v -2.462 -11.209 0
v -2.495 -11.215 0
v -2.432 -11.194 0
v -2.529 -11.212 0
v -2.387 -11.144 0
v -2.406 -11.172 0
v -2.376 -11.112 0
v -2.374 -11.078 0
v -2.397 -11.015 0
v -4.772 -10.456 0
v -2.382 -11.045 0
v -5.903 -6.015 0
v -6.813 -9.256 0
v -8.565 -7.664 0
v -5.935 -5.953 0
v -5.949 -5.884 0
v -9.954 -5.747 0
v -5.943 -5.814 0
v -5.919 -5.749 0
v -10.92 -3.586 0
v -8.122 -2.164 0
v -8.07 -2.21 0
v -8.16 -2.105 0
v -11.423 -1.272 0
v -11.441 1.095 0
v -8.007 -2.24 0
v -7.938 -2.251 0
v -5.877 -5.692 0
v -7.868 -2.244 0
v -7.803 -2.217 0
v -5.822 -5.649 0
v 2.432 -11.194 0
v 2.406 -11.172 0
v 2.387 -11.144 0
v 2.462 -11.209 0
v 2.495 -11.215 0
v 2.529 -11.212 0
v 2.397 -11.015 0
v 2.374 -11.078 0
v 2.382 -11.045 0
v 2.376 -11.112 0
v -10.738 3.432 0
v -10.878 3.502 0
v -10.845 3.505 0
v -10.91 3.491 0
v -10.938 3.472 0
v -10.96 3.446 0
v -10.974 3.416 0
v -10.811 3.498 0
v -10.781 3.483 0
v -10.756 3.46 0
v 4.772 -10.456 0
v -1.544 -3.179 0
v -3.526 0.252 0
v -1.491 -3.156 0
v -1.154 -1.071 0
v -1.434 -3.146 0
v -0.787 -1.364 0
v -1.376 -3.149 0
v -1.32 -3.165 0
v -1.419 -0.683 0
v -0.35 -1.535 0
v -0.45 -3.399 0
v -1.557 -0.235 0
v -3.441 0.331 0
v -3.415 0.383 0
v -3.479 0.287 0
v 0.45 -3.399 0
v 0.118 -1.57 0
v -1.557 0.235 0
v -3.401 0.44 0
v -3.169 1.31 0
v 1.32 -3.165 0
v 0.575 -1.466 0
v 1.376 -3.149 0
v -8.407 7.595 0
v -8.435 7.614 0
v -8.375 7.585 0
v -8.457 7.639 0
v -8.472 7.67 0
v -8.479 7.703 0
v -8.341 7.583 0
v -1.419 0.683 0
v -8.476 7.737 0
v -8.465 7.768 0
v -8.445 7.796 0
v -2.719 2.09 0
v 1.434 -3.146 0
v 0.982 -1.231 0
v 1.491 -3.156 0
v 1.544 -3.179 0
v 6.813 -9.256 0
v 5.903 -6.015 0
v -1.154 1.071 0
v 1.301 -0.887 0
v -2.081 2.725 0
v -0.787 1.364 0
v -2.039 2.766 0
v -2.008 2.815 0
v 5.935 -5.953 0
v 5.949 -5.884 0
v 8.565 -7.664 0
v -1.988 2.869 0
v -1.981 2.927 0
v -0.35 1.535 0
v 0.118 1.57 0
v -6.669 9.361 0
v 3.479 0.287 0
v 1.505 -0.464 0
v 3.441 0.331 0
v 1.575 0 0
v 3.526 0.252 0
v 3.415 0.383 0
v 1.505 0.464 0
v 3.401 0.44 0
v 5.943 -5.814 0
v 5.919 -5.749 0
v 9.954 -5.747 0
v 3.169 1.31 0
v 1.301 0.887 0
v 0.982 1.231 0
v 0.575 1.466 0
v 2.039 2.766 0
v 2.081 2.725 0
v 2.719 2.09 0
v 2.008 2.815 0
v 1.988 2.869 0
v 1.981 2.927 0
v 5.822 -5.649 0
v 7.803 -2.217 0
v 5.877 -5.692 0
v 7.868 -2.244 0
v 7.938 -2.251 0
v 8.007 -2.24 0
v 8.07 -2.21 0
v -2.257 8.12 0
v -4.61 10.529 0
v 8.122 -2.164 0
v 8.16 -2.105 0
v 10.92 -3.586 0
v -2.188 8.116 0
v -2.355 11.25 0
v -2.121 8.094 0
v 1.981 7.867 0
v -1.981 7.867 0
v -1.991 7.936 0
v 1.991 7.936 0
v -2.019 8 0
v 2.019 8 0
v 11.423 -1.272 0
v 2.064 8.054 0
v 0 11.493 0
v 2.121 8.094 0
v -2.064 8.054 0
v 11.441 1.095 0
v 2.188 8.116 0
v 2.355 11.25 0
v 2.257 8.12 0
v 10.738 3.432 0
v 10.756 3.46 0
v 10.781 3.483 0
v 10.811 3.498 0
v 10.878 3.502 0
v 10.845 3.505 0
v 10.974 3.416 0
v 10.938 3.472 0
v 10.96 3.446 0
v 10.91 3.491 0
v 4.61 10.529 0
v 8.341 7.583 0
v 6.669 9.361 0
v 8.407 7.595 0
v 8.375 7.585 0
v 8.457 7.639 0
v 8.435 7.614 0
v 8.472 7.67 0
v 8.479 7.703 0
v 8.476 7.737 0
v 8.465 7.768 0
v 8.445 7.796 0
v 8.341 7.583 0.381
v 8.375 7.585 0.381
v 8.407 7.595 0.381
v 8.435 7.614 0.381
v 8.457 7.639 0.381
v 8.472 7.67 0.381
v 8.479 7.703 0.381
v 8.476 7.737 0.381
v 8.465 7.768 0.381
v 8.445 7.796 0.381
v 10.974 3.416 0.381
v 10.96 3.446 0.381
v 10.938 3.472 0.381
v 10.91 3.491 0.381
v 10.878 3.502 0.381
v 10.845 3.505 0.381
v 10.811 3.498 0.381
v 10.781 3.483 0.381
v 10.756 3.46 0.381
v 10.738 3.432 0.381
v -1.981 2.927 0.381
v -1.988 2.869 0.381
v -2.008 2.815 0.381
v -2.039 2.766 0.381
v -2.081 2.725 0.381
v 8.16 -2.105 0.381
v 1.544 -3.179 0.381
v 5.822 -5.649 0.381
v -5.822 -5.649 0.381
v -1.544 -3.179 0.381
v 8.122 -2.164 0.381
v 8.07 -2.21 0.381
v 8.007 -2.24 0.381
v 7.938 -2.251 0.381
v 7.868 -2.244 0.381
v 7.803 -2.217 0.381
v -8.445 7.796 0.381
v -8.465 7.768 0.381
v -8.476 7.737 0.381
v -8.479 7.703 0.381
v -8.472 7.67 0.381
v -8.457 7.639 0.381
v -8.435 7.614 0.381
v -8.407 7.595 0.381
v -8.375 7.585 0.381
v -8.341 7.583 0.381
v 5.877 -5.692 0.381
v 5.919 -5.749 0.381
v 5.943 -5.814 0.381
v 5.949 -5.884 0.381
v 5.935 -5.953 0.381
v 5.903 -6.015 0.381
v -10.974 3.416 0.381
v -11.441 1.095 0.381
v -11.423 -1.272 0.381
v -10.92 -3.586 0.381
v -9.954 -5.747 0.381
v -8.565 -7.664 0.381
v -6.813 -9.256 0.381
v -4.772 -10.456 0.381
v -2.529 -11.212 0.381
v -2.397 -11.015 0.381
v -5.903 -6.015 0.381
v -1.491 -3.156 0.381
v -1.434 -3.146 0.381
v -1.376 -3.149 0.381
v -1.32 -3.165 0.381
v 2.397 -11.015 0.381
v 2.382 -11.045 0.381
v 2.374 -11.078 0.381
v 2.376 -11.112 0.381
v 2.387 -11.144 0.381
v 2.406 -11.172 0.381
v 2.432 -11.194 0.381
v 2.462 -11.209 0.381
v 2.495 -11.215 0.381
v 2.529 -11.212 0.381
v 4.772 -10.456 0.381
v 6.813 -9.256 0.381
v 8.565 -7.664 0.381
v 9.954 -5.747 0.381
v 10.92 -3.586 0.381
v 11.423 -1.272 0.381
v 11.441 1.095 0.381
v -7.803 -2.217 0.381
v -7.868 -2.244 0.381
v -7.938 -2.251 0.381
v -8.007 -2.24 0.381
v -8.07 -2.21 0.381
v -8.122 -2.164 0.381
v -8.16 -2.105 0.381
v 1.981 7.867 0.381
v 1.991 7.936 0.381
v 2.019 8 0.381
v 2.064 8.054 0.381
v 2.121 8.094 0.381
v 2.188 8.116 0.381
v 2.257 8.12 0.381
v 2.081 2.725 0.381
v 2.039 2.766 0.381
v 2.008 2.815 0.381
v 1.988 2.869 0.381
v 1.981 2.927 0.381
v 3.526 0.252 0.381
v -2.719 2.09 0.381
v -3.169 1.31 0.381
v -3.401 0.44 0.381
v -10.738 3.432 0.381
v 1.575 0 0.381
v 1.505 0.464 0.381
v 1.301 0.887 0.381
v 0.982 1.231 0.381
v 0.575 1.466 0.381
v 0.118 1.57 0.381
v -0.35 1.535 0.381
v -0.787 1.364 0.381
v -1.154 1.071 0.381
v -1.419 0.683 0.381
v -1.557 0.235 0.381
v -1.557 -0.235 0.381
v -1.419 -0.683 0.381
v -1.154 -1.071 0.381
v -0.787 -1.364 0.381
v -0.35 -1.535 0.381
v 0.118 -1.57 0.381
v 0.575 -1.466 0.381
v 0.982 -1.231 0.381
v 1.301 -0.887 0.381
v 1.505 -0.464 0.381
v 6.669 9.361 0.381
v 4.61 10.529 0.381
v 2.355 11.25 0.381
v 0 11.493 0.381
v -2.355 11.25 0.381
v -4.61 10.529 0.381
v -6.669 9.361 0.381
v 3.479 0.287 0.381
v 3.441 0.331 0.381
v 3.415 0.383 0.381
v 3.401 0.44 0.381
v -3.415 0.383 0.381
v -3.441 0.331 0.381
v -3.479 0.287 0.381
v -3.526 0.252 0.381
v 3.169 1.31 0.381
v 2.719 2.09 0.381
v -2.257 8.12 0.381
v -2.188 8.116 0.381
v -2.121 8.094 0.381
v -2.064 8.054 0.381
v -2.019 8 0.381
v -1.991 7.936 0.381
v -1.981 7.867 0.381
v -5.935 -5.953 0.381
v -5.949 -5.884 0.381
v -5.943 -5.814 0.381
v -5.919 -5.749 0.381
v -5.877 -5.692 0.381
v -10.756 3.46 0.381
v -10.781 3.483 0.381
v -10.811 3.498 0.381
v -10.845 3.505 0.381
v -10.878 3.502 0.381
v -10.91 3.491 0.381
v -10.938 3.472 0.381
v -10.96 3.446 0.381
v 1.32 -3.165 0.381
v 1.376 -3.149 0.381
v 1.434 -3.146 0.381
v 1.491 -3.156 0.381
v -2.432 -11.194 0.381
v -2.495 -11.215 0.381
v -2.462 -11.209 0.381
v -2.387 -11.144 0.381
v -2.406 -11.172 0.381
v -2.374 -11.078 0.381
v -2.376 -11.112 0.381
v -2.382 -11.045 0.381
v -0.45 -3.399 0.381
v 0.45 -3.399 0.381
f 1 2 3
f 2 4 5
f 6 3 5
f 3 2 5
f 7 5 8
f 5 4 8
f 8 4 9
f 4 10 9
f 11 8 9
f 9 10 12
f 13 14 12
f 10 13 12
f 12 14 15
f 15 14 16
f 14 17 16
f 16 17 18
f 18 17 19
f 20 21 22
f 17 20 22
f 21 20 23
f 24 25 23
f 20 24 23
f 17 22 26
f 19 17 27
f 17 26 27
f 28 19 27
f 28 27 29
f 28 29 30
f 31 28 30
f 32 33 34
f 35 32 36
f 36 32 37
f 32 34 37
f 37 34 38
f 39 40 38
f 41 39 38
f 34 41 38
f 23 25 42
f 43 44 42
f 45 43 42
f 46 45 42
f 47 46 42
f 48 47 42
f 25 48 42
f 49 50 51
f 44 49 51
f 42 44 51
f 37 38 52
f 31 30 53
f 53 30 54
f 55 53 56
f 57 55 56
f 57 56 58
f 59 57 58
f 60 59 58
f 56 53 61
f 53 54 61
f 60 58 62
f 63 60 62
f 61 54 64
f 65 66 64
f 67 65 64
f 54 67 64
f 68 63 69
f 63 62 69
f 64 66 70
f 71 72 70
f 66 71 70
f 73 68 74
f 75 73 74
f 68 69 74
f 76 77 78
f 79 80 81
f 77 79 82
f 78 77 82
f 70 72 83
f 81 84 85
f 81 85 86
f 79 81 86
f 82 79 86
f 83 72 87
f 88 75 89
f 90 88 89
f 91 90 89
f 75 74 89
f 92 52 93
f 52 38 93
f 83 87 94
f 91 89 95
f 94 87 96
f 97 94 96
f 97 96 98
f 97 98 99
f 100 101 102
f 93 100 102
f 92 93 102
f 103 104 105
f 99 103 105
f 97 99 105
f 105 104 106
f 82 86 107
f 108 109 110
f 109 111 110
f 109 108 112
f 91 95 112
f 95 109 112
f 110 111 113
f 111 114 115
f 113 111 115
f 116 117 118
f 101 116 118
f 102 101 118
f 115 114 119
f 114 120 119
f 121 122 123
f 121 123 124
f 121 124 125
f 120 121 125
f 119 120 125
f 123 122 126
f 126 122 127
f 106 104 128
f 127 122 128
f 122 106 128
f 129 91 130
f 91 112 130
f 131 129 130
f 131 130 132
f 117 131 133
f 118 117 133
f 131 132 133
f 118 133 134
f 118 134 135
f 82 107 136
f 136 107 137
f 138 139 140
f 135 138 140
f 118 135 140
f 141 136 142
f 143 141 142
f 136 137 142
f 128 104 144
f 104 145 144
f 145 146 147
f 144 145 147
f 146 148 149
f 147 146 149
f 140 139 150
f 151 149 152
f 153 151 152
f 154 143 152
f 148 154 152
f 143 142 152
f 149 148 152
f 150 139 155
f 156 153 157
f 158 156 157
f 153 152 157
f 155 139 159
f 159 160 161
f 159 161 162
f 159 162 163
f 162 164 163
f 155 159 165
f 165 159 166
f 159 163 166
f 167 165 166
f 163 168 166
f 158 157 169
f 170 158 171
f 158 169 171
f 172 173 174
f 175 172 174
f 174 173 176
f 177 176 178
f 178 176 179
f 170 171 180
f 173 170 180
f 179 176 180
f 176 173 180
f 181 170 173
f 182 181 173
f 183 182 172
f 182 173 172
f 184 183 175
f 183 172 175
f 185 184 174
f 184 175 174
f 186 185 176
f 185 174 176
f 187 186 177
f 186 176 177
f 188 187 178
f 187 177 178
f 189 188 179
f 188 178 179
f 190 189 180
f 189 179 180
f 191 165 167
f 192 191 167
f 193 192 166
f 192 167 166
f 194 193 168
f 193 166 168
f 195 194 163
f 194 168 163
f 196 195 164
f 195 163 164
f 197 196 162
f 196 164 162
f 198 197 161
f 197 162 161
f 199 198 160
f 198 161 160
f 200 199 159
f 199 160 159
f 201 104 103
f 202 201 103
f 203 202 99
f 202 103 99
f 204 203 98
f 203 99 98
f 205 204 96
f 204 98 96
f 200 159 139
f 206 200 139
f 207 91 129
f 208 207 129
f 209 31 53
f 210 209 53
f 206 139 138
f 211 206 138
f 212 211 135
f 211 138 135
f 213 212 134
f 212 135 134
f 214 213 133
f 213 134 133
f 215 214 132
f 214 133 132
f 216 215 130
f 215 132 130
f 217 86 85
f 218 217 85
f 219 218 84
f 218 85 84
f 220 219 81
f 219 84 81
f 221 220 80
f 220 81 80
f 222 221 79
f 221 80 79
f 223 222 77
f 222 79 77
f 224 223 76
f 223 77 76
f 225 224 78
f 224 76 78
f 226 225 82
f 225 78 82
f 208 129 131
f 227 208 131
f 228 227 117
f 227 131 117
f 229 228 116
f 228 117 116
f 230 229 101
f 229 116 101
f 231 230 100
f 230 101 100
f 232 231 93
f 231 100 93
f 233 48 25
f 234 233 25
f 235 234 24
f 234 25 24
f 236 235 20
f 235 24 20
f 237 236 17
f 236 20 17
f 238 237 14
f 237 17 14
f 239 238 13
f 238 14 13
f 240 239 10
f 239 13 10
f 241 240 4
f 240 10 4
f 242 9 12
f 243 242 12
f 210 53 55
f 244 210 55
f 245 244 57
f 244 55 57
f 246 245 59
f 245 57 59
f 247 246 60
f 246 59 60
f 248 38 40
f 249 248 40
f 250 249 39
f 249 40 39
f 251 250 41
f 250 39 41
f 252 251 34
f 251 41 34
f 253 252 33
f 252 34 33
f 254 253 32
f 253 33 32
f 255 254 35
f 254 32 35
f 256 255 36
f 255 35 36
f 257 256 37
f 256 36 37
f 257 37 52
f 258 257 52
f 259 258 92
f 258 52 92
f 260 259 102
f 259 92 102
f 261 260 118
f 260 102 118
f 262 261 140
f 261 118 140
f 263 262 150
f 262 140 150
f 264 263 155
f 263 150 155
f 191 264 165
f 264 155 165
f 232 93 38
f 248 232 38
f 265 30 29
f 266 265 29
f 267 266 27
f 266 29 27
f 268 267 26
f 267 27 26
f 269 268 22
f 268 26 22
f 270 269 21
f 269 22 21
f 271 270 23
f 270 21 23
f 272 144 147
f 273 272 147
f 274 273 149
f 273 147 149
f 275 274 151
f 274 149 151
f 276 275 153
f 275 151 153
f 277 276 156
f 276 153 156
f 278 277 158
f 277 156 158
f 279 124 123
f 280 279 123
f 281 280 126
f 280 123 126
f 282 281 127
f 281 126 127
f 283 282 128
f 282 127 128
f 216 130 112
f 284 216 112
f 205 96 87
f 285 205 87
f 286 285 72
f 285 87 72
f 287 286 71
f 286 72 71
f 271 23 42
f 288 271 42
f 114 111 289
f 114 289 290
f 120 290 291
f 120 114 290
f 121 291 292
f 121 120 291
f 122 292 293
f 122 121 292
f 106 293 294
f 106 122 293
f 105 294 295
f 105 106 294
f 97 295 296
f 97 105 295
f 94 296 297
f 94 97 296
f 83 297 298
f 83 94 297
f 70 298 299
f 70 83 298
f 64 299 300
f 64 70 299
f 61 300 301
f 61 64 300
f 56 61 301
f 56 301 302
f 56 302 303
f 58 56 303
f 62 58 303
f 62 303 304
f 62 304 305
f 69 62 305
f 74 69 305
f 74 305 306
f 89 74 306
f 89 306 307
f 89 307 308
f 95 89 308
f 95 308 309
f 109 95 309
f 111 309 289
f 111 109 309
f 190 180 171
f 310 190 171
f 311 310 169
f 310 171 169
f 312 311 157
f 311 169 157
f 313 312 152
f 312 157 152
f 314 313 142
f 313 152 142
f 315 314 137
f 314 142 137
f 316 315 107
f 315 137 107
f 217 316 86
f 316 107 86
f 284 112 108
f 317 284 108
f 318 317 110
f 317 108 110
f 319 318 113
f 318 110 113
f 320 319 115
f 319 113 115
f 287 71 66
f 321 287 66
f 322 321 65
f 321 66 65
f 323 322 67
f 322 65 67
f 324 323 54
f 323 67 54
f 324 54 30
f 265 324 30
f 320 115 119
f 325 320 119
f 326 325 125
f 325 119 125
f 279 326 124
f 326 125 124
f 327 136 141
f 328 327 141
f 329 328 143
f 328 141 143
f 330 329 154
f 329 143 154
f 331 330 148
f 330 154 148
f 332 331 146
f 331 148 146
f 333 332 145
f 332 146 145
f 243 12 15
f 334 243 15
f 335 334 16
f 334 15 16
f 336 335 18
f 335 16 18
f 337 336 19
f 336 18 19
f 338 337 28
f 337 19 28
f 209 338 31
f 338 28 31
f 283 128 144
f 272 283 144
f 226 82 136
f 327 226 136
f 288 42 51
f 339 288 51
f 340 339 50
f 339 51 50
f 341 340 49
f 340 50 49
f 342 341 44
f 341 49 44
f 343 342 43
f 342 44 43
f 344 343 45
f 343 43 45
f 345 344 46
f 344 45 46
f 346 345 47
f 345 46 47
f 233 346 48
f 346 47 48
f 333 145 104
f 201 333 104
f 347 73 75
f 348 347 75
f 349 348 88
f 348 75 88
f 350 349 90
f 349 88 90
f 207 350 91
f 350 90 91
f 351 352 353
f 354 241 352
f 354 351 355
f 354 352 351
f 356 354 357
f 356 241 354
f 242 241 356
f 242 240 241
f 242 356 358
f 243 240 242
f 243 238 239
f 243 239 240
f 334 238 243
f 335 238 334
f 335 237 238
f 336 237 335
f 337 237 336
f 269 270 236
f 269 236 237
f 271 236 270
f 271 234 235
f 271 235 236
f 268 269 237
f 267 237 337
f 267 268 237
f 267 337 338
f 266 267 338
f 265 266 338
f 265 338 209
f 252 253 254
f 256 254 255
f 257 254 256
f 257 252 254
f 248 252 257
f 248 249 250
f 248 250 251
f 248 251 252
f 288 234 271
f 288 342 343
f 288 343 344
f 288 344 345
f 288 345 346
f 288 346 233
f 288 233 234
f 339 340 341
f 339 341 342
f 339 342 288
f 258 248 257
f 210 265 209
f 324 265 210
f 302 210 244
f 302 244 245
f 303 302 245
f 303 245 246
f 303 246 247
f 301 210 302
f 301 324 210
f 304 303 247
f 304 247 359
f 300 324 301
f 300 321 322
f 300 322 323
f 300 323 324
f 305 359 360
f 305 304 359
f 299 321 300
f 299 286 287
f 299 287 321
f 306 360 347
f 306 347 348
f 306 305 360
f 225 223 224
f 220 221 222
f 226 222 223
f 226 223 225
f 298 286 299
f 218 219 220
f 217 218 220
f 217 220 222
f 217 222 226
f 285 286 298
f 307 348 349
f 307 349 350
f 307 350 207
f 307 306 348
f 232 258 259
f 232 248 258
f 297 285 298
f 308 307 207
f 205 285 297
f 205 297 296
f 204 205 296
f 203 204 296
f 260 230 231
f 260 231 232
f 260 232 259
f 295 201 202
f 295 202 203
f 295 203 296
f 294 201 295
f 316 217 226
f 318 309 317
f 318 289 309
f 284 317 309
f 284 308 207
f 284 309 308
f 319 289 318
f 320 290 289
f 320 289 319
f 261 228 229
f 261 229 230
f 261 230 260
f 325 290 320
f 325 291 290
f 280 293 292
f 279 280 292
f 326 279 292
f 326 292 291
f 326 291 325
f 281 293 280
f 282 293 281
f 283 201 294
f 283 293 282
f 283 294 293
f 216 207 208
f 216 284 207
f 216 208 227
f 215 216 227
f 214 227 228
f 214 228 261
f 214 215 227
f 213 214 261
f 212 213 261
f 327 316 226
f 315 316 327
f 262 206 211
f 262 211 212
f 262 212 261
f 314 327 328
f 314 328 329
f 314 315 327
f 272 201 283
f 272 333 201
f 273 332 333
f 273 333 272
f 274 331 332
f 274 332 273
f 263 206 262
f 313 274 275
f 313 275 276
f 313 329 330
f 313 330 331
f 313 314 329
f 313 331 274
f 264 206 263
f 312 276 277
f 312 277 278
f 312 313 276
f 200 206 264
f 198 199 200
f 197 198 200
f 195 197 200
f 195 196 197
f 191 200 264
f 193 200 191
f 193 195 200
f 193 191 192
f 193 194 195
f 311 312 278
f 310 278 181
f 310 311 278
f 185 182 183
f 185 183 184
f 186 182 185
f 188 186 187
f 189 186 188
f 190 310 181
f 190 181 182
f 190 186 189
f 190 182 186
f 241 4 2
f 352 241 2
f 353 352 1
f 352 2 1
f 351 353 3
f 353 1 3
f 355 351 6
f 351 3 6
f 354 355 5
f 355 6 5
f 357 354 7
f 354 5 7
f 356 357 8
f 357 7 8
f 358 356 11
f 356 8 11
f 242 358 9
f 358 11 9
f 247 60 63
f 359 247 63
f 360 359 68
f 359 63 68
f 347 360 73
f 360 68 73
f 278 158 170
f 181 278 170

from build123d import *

# Parameters (mm, degrees)
SKETCH1_R           = 1.5748
BOSS_EXTRUDE1_DEPTH = 0.381


with BuildPart() as part:
    # Sketch1 → Boss-Extrude1 (new body)
    with BuildSketch(Plane.XY):
        with BuildLine():
            Line((1.9812, 2.927177815), (1.9812, 7.866528823))
            ThreePointArc((1.9812, 7.866528823), (2.063659626, 8.053851807), (2.257498427, 8.119548151))
            Line((2.257498427, 8.119548151), (8.340740358, 7.583436046))
            ThreePointArc((8.340740358, 7.583436046), (8.465877984, 7.653948909), (8.445206773, 7.796090354))
            ThreePointArc((8.445206773, 7.796090354), (0, 11.4935), (-8.445206773, 7.796090354))
            ThreePointArc((-8.445206773, 7.796090354), (-8.465877984, 7.653948909), (-8.340740358, 7.583436046))
            Line((-8.340740358, 7.583436046), (-2.257498427, 8.119548151))
            ThreePointArc((-2.257498427, 8.119548151), (-2.063659626, 8.053851806), (-1.9812, 7.866528823))
            Line((-1.9812, 7.866528823), (-1.9812, 2.927177815))
            ThreePointArc((-1.9812, 2.927177815), (-2.007526398, 2.814569063), (-2.081048276, 2.725303483))
            ThreePointArc((-2.081048276, 2.725303483), (-2.96960111, 1.7145), (-3.400706187, 0.439588932))
            ThreePointArc((-3.400706187, 0.439588932), (-3.441251508, 0.331284328), (-3.525610349, 0.252180623))
            Line((-3.525610349, 0.252180623), (-7.8032138, -2.217494881))
            ThreePointArc((-7.8032138, -2.217494881), (-8.006670076, -2.239744242), (-8.160484179, -2.104723089))
            Line((-8.160484179, -2.104723089), (-10.737818442, 3.431575013))
            ThreePointArc((-10.737818442, 3.431575013), (-10.861453187, 3.504690945), (-10.974215684, 3.415718428))
            ThreePointArc((-10.974215684, 3.415718428), (-9.953662978, -5.74675), (-2.529008911, -11.211808783))
            ThreePointArc((-2.529008911, -11.211808783), (-2.395575203, -11.158639854), (-2.397078085, -11.015011059))
            Line((-2.397078085, -11.015011059), (-5.902985752, -6.014825062))
            ThreePointArc((-5.902985752, -6.014825062), (-5.94301045, -5.814107564), (-5.8220138, -5.649033941))
            Line((-5.8220138, -5.649033941), (-1.544410349, -3.179358437))
            ThreePointArc((-1.544410349, -3.179358437), (-1.43372511, -3.145853391), (-1.319657911, -3.164892415))
            ThreePointArc((-1.319657911, -3.164892415), (0, -3.429), (1.319657911, -3.164892415))
            ThreePointArc((1.319657911, -3.164892415), (1.43372511, -3.145853391), (1.544410349, -3.179358437))
            Line((1.544410349, -3.179358437), (5.8220138, -5.649033941))
            ThreePointArc((5.8220138, -5.649033941), (5.94301045, -5.814107564), (5.902985752, -6.014825062))
            Line((5.902985752, -6.014825062), (2.397078085, -11.015011059))
            ThreePointArc((2.397078085, -11.015011059), (2.395575203, -11.158639854), (2.529008911, -11.211808783))
            ThreePointArc((2.529008911, -11.211808783), (9.953662978, -5.74675), (10.974215684, 3.415718428))
            ThreePointArc((10.974215684, 3.415718428), (10.861453187, 3.504690945), (10.737818442, 3.431575013))
            Line((10.737818442, 3.431575013), (8.160484179, -2.104723089))
            ThreePointArc((8.160484179, -2.104723089), (8.006670076, -2.239744242), (7.8032138, -2.217494881))
            Line((7.8032138, -2.217494881), (3.525610349, 0.252180623))
            ThreePointArc((3.525610349, 0.252180623), (3.441251508, 0.331284328), (3.400706187, 0.439588932))
            ThreePointArc((3.400706187, 0.439588932), (2.96960111, 1.7145), (2.081048276, 2.725303483))
            ThreePointArc((2.081048276, 2.725303483), (2.007526398, 2.814569063), (1.9812, 2.927177815))
        make_face()
        Circle(SKETCH1_R, mode=Mode.SUBTRACT)
    extrude(amount=BOSS_EXTRUDE1_DEPTH)


solid = part.part
